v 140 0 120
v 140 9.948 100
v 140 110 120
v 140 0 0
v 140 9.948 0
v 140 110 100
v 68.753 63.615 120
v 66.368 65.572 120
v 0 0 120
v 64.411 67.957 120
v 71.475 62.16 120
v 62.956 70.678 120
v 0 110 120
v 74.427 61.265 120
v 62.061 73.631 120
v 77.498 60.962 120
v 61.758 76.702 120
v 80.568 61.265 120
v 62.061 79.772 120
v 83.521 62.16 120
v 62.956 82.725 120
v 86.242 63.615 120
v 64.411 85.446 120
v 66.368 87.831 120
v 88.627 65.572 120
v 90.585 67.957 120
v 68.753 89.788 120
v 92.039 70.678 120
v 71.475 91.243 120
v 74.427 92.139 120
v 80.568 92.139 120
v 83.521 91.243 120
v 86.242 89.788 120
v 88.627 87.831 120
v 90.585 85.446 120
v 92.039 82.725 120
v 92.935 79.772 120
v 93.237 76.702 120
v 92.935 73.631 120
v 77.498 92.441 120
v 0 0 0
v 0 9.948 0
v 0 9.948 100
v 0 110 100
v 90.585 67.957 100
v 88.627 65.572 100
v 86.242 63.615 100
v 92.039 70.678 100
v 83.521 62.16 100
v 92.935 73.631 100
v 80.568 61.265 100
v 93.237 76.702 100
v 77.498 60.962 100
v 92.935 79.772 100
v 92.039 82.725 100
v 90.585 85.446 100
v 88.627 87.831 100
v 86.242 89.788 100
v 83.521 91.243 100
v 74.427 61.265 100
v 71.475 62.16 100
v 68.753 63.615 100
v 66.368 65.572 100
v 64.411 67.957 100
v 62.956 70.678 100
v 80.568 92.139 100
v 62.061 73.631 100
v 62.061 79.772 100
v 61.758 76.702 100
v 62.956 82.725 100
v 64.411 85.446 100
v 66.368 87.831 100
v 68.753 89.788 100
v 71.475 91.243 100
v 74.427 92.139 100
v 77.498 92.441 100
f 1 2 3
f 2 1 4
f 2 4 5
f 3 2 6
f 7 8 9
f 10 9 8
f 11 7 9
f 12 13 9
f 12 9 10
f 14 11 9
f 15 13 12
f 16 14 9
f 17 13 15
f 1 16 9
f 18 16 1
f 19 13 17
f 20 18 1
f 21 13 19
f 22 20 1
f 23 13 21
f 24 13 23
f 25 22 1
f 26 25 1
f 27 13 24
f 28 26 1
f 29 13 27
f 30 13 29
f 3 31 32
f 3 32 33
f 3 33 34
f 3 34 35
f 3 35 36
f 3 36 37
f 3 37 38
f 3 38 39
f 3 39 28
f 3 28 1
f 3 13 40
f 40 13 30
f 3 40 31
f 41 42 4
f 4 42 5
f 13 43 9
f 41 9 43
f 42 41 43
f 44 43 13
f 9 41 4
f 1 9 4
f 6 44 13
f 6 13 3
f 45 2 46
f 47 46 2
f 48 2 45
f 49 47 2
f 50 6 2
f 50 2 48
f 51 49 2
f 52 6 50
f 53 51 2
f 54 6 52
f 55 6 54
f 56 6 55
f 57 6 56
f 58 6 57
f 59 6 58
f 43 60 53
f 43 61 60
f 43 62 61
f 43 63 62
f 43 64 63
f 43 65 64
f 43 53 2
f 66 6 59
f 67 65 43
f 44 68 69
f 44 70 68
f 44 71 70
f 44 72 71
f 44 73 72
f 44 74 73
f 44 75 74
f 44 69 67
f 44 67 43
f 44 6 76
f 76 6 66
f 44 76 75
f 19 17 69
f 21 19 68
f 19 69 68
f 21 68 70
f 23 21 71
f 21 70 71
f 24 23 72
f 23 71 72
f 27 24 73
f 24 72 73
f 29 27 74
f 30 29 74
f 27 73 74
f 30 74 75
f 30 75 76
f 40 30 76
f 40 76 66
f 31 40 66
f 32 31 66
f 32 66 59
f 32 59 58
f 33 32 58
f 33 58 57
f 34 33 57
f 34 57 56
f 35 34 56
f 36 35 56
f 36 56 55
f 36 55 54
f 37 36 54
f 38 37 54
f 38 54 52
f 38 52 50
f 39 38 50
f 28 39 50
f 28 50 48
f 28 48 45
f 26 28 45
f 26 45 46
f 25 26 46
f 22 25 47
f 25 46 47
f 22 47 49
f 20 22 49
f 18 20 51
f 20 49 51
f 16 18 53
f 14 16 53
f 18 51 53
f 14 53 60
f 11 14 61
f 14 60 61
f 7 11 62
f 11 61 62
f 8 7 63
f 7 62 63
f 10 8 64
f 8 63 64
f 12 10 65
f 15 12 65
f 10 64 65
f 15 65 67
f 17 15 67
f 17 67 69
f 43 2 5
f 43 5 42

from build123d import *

# Parameters (mm, degrees)
SKETCH1_W               = 140
SKETCH1_H               = 110
BOSS_EXTRUDE1_DEPTH     = 120
CUT_EXTRUDE1_DEPTH      = 215.709105536
CUT_EXTRUDE1_DEPTH_BACK = 100
SKETCH3_R               = 15.739400913
CUT_EXTRUDE2_DEPTH      = 205.205778567


with BuildPart() as part:
    # Sketch1 → Boss-Extrude1 (new body)
    with BuildSketch(Plane.XY):
        with Locations((70, 55)):
            Rectangle(SKETCH1_W, SKETCH1_H)
    extrude(amount=BOSS_EXTRUDE1_DEPTH)

    # Sketch2 → Cut-Extrude1 (cut, two sides: drawn at the far end of the back side and taken through both)
    with BuildSketch(Plane(origin=(0, 0, 0), x_dir=(-1, 0, 0), z_dir=(0, 0, -1)).offset(-CUT_EXTRUDE1_DEPTH_BACK)):
        Polygon((-494.154006157, 9.947538818), (-140, 9.947538818), (0, 9.947538818), (354.154006157, 9.947538818), (354.154006157, 718.255551133), (-494.154006157, 718.255551133), align=None)
    extrude(amount=CUT_EXTRUDE1_DEPTH + CUT_EXTRUDE1_DEPTH_BACK, mode=Mode.SUBTRACT)

    # Sketch3 → Cut-Extrude2 (cut, through all)
    with BuildSketch(Plane(origin=(0, 0, 100), x_dir=(-1, 0, 0), z_dir=(0, 0, -1))):
        with Locations((-77.497780525, 76.701563568)):
            Circle(SKETCH3_R)
    extrude(amount=-CUT_EXTRUDE2_DEPTH, mode=Mode.SUBTRACT)


solid = part.part
